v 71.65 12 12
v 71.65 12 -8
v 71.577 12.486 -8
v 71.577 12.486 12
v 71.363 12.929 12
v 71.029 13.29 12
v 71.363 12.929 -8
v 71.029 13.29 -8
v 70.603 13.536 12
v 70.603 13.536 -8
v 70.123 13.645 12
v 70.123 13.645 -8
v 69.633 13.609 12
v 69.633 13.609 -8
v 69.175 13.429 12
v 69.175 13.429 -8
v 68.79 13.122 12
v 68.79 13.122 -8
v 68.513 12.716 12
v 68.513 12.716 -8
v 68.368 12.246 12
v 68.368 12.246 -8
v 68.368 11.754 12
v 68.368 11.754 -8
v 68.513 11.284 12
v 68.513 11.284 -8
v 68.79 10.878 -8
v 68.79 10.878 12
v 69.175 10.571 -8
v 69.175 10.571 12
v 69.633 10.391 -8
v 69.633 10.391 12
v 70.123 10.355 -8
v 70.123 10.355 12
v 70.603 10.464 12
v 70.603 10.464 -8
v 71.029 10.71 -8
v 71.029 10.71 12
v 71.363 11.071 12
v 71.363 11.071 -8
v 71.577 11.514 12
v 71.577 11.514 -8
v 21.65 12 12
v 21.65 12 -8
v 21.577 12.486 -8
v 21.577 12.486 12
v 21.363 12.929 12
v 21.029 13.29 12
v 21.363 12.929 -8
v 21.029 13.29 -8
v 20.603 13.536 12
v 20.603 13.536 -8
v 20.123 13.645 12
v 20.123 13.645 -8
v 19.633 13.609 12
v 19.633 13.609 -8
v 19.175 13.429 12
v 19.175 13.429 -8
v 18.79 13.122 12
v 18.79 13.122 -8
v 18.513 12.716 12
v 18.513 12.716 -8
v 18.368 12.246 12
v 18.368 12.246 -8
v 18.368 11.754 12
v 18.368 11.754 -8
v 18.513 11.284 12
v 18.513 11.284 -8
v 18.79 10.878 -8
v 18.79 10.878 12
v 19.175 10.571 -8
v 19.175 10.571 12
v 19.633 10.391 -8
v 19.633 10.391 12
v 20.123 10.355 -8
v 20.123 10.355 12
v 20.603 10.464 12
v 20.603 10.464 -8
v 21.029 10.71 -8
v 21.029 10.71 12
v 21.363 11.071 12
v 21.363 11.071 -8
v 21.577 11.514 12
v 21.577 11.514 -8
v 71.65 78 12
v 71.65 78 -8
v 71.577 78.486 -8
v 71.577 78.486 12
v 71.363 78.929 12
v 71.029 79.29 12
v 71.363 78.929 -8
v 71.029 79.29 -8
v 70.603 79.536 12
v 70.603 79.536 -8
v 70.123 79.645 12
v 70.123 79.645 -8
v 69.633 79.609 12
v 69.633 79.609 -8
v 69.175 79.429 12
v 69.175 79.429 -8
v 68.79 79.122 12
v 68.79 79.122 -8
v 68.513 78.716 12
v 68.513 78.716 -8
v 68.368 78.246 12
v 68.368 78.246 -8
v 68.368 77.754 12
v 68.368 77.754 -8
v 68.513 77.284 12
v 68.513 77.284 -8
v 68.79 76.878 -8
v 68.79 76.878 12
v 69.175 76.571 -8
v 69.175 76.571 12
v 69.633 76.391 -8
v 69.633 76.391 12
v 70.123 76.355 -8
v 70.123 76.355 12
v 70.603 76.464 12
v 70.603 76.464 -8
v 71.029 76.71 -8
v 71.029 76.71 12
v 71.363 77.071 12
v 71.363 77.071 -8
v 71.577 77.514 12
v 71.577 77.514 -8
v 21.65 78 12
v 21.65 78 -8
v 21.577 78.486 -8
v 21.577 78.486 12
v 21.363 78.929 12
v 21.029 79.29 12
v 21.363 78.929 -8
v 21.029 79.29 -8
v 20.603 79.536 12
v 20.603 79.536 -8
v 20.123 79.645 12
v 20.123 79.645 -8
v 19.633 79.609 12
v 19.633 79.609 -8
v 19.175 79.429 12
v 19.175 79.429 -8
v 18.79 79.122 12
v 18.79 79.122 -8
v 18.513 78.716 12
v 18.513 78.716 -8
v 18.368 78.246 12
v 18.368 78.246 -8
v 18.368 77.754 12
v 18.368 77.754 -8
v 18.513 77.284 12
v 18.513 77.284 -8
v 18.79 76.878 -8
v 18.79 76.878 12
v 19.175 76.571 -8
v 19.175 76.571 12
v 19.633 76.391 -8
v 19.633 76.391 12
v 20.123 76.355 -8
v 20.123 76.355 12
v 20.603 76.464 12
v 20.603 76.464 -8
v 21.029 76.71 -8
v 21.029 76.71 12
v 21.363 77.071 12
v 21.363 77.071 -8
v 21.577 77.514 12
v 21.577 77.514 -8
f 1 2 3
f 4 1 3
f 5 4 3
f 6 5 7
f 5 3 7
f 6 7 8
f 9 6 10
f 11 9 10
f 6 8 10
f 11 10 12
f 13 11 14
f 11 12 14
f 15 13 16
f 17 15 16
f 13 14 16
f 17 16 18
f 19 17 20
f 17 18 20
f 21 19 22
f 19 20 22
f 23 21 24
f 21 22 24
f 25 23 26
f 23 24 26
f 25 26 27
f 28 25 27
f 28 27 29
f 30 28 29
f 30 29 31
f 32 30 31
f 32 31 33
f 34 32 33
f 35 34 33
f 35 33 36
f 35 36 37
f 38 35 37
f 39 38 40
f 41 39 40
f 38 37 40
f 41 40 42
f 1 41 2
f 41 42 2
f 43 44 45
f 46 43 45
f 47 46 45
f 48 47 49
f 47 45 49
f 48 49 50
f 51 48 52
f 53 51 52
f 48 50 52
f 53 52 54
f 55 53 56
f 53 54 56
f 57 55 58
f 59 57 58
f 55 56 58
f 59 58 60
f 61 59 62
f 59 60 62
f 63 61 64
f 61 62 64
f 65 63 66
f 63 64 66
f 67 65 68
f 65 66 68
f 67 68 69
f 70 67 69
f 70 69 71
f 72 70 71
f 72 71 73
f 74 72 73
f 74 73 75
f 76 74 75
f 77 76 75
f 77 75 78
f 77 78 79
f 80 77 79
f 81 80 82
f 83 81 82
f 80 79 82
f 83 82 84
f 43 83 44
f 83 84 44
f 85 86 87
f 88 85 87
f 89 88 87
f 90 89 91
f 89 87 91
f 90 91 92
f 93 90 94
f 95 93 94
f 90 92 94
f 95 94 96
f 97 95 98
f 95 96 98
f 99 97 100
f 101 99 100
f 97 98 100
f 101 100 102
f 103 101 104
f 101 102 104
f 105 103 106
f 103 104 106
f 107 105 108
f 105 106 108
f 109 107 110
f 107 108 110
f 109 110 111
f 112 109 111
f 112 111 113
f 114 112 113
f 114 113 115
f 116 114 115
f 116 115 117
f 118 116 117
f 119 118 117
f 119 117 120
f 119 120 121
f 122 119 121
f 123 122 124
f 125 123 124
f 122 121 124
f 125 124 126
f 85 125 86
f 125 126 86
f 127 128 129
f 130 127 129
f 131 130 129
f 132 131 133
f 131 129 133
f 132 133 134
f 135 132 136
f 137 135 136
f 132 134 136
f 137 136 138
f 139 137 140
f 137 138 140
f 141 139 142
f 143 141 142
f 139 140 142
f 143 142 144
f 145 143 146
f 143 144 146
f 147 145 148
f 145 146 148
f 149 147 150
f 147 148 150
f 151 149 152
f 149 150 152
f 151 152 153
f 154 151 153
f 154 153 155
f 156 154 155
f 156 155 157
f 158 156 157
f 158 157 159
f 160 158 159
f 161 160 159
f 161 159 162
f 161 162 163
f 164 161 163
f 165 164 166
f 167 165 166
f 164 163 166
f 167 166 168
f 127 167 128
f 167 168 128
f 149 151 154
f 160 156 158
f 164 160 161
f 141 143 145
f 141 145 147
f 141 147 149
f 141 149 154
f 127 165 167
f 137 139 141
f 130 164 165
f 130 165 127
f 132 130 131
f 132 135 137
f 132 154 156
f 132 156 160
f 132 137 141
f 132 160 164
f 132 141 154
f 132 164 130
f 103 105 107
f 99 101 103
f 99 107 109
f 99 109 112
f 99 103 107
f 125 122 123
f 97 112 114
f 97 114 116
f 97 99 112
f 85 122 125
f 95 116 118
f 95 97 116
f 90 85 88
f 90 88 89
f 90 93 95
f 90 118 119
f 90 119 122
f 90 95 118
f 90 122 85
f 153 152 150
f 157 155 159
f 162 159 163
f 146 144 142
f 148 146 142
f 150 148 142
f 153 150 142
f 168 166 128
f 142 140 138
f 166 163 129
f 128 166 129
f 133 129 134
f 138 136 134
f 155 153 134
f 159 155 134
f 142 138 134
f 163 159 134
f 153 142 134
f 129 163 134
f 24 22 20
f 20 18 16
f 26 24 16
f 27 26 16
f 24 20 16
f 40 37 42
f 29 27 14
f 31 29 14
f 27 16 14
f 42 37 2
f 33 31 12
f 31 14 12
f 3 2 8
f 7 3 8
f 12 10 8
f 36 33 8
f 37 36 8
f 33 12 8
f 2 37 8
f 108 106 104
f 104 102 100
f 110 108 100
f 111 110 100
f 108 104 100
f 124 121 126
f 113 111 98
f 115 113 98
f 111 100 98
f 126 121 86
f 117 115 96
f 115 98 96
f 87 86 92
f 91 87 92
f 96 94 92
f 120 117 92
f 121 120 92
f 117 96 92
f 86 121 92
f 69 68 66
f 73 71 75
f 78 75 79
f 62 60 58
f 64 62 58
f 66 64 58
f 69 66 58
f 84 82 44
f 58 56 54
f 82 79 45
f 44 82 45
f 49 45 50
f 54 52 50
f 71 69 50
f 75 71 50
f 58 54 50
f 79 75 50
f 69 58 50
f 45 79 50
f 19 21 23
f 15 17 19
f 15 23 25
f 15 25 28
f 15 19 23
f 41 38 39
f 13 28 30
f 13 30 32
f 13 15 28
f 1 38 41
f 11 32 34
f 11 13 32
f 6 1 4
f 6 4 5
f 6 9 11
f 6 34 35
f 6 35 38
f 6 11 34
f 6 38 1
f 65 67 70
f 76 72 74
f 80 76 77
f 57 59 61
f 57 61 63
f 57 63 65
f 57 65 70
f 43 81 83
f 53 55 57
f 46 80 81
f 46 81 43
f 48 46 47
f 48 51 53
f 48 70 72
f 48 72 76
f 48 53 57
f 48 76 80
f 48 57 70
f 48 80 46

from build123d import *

# Parameters (mm, degrees)
CYLINDER029_R     = 1.65
CYLINDER029_DEPTH = 20
CYLINDER030_R     = 1.65
CYLINDER030_DEPTH = 20
CYLINDER031_R     = 1.65
CYLINDER031_DEPTH = 20
CYLINDER028_R     = 1.65
CYLINDER028_DEPTH = 20


with BuildPart() as cylinder029:
    # Cylinder029 → Cylinder029 (new body)
    with BuildSketch(Plane(origin=(70, 12, -8), x_dir=(1, 0, 0), z_dir=(0, 0, 1))):
        Circle(CYLINDER029_R)
    extrude(amount=CYLINDER029_DEPTH)


with BuildPart() as cylinder030:
    # Cylinder030 → Cylinder030 (new body)
    with BuildSketch(Plane(origin=(70, 78, -8), x_dir=(1, 0, 0), z_dir=(0, 0, 1))):
        Circle(CYLINDER030_R)
    extrude(amount=CYLINDER030_DEPTH)


with BuildPart() as cylinder031:
    # Cylinder031 → Cylinder031 (new body)
    with BuildSketch(Plane(origin=(20, 78, -8), x_dir=(1, 0, 0), z_dir=(0, 0, 1))):
        Circle(CYLINDER031_R)
    extrude(amount=CYLINDER031_DEPTH)


with BuildPart() as fusion046:
    # Cylinder028 → Cylinder028 (new body)
    with BuildSketch(Plane(origin=(20, 12, -8), x_dir=(1, 0, 0), z_dir=(0, 0, 1))):
        Circle(CYLINDER028_R)
    extrude(amount=CYLINDER028_DEPTH)

    # Fusion046: union Cylinder029, Cylinder030, Cylinder031
    add(cylinder029.part)
    add(cylinder030.part)
    add(cylinder031.part)


solid = fusion046.part
